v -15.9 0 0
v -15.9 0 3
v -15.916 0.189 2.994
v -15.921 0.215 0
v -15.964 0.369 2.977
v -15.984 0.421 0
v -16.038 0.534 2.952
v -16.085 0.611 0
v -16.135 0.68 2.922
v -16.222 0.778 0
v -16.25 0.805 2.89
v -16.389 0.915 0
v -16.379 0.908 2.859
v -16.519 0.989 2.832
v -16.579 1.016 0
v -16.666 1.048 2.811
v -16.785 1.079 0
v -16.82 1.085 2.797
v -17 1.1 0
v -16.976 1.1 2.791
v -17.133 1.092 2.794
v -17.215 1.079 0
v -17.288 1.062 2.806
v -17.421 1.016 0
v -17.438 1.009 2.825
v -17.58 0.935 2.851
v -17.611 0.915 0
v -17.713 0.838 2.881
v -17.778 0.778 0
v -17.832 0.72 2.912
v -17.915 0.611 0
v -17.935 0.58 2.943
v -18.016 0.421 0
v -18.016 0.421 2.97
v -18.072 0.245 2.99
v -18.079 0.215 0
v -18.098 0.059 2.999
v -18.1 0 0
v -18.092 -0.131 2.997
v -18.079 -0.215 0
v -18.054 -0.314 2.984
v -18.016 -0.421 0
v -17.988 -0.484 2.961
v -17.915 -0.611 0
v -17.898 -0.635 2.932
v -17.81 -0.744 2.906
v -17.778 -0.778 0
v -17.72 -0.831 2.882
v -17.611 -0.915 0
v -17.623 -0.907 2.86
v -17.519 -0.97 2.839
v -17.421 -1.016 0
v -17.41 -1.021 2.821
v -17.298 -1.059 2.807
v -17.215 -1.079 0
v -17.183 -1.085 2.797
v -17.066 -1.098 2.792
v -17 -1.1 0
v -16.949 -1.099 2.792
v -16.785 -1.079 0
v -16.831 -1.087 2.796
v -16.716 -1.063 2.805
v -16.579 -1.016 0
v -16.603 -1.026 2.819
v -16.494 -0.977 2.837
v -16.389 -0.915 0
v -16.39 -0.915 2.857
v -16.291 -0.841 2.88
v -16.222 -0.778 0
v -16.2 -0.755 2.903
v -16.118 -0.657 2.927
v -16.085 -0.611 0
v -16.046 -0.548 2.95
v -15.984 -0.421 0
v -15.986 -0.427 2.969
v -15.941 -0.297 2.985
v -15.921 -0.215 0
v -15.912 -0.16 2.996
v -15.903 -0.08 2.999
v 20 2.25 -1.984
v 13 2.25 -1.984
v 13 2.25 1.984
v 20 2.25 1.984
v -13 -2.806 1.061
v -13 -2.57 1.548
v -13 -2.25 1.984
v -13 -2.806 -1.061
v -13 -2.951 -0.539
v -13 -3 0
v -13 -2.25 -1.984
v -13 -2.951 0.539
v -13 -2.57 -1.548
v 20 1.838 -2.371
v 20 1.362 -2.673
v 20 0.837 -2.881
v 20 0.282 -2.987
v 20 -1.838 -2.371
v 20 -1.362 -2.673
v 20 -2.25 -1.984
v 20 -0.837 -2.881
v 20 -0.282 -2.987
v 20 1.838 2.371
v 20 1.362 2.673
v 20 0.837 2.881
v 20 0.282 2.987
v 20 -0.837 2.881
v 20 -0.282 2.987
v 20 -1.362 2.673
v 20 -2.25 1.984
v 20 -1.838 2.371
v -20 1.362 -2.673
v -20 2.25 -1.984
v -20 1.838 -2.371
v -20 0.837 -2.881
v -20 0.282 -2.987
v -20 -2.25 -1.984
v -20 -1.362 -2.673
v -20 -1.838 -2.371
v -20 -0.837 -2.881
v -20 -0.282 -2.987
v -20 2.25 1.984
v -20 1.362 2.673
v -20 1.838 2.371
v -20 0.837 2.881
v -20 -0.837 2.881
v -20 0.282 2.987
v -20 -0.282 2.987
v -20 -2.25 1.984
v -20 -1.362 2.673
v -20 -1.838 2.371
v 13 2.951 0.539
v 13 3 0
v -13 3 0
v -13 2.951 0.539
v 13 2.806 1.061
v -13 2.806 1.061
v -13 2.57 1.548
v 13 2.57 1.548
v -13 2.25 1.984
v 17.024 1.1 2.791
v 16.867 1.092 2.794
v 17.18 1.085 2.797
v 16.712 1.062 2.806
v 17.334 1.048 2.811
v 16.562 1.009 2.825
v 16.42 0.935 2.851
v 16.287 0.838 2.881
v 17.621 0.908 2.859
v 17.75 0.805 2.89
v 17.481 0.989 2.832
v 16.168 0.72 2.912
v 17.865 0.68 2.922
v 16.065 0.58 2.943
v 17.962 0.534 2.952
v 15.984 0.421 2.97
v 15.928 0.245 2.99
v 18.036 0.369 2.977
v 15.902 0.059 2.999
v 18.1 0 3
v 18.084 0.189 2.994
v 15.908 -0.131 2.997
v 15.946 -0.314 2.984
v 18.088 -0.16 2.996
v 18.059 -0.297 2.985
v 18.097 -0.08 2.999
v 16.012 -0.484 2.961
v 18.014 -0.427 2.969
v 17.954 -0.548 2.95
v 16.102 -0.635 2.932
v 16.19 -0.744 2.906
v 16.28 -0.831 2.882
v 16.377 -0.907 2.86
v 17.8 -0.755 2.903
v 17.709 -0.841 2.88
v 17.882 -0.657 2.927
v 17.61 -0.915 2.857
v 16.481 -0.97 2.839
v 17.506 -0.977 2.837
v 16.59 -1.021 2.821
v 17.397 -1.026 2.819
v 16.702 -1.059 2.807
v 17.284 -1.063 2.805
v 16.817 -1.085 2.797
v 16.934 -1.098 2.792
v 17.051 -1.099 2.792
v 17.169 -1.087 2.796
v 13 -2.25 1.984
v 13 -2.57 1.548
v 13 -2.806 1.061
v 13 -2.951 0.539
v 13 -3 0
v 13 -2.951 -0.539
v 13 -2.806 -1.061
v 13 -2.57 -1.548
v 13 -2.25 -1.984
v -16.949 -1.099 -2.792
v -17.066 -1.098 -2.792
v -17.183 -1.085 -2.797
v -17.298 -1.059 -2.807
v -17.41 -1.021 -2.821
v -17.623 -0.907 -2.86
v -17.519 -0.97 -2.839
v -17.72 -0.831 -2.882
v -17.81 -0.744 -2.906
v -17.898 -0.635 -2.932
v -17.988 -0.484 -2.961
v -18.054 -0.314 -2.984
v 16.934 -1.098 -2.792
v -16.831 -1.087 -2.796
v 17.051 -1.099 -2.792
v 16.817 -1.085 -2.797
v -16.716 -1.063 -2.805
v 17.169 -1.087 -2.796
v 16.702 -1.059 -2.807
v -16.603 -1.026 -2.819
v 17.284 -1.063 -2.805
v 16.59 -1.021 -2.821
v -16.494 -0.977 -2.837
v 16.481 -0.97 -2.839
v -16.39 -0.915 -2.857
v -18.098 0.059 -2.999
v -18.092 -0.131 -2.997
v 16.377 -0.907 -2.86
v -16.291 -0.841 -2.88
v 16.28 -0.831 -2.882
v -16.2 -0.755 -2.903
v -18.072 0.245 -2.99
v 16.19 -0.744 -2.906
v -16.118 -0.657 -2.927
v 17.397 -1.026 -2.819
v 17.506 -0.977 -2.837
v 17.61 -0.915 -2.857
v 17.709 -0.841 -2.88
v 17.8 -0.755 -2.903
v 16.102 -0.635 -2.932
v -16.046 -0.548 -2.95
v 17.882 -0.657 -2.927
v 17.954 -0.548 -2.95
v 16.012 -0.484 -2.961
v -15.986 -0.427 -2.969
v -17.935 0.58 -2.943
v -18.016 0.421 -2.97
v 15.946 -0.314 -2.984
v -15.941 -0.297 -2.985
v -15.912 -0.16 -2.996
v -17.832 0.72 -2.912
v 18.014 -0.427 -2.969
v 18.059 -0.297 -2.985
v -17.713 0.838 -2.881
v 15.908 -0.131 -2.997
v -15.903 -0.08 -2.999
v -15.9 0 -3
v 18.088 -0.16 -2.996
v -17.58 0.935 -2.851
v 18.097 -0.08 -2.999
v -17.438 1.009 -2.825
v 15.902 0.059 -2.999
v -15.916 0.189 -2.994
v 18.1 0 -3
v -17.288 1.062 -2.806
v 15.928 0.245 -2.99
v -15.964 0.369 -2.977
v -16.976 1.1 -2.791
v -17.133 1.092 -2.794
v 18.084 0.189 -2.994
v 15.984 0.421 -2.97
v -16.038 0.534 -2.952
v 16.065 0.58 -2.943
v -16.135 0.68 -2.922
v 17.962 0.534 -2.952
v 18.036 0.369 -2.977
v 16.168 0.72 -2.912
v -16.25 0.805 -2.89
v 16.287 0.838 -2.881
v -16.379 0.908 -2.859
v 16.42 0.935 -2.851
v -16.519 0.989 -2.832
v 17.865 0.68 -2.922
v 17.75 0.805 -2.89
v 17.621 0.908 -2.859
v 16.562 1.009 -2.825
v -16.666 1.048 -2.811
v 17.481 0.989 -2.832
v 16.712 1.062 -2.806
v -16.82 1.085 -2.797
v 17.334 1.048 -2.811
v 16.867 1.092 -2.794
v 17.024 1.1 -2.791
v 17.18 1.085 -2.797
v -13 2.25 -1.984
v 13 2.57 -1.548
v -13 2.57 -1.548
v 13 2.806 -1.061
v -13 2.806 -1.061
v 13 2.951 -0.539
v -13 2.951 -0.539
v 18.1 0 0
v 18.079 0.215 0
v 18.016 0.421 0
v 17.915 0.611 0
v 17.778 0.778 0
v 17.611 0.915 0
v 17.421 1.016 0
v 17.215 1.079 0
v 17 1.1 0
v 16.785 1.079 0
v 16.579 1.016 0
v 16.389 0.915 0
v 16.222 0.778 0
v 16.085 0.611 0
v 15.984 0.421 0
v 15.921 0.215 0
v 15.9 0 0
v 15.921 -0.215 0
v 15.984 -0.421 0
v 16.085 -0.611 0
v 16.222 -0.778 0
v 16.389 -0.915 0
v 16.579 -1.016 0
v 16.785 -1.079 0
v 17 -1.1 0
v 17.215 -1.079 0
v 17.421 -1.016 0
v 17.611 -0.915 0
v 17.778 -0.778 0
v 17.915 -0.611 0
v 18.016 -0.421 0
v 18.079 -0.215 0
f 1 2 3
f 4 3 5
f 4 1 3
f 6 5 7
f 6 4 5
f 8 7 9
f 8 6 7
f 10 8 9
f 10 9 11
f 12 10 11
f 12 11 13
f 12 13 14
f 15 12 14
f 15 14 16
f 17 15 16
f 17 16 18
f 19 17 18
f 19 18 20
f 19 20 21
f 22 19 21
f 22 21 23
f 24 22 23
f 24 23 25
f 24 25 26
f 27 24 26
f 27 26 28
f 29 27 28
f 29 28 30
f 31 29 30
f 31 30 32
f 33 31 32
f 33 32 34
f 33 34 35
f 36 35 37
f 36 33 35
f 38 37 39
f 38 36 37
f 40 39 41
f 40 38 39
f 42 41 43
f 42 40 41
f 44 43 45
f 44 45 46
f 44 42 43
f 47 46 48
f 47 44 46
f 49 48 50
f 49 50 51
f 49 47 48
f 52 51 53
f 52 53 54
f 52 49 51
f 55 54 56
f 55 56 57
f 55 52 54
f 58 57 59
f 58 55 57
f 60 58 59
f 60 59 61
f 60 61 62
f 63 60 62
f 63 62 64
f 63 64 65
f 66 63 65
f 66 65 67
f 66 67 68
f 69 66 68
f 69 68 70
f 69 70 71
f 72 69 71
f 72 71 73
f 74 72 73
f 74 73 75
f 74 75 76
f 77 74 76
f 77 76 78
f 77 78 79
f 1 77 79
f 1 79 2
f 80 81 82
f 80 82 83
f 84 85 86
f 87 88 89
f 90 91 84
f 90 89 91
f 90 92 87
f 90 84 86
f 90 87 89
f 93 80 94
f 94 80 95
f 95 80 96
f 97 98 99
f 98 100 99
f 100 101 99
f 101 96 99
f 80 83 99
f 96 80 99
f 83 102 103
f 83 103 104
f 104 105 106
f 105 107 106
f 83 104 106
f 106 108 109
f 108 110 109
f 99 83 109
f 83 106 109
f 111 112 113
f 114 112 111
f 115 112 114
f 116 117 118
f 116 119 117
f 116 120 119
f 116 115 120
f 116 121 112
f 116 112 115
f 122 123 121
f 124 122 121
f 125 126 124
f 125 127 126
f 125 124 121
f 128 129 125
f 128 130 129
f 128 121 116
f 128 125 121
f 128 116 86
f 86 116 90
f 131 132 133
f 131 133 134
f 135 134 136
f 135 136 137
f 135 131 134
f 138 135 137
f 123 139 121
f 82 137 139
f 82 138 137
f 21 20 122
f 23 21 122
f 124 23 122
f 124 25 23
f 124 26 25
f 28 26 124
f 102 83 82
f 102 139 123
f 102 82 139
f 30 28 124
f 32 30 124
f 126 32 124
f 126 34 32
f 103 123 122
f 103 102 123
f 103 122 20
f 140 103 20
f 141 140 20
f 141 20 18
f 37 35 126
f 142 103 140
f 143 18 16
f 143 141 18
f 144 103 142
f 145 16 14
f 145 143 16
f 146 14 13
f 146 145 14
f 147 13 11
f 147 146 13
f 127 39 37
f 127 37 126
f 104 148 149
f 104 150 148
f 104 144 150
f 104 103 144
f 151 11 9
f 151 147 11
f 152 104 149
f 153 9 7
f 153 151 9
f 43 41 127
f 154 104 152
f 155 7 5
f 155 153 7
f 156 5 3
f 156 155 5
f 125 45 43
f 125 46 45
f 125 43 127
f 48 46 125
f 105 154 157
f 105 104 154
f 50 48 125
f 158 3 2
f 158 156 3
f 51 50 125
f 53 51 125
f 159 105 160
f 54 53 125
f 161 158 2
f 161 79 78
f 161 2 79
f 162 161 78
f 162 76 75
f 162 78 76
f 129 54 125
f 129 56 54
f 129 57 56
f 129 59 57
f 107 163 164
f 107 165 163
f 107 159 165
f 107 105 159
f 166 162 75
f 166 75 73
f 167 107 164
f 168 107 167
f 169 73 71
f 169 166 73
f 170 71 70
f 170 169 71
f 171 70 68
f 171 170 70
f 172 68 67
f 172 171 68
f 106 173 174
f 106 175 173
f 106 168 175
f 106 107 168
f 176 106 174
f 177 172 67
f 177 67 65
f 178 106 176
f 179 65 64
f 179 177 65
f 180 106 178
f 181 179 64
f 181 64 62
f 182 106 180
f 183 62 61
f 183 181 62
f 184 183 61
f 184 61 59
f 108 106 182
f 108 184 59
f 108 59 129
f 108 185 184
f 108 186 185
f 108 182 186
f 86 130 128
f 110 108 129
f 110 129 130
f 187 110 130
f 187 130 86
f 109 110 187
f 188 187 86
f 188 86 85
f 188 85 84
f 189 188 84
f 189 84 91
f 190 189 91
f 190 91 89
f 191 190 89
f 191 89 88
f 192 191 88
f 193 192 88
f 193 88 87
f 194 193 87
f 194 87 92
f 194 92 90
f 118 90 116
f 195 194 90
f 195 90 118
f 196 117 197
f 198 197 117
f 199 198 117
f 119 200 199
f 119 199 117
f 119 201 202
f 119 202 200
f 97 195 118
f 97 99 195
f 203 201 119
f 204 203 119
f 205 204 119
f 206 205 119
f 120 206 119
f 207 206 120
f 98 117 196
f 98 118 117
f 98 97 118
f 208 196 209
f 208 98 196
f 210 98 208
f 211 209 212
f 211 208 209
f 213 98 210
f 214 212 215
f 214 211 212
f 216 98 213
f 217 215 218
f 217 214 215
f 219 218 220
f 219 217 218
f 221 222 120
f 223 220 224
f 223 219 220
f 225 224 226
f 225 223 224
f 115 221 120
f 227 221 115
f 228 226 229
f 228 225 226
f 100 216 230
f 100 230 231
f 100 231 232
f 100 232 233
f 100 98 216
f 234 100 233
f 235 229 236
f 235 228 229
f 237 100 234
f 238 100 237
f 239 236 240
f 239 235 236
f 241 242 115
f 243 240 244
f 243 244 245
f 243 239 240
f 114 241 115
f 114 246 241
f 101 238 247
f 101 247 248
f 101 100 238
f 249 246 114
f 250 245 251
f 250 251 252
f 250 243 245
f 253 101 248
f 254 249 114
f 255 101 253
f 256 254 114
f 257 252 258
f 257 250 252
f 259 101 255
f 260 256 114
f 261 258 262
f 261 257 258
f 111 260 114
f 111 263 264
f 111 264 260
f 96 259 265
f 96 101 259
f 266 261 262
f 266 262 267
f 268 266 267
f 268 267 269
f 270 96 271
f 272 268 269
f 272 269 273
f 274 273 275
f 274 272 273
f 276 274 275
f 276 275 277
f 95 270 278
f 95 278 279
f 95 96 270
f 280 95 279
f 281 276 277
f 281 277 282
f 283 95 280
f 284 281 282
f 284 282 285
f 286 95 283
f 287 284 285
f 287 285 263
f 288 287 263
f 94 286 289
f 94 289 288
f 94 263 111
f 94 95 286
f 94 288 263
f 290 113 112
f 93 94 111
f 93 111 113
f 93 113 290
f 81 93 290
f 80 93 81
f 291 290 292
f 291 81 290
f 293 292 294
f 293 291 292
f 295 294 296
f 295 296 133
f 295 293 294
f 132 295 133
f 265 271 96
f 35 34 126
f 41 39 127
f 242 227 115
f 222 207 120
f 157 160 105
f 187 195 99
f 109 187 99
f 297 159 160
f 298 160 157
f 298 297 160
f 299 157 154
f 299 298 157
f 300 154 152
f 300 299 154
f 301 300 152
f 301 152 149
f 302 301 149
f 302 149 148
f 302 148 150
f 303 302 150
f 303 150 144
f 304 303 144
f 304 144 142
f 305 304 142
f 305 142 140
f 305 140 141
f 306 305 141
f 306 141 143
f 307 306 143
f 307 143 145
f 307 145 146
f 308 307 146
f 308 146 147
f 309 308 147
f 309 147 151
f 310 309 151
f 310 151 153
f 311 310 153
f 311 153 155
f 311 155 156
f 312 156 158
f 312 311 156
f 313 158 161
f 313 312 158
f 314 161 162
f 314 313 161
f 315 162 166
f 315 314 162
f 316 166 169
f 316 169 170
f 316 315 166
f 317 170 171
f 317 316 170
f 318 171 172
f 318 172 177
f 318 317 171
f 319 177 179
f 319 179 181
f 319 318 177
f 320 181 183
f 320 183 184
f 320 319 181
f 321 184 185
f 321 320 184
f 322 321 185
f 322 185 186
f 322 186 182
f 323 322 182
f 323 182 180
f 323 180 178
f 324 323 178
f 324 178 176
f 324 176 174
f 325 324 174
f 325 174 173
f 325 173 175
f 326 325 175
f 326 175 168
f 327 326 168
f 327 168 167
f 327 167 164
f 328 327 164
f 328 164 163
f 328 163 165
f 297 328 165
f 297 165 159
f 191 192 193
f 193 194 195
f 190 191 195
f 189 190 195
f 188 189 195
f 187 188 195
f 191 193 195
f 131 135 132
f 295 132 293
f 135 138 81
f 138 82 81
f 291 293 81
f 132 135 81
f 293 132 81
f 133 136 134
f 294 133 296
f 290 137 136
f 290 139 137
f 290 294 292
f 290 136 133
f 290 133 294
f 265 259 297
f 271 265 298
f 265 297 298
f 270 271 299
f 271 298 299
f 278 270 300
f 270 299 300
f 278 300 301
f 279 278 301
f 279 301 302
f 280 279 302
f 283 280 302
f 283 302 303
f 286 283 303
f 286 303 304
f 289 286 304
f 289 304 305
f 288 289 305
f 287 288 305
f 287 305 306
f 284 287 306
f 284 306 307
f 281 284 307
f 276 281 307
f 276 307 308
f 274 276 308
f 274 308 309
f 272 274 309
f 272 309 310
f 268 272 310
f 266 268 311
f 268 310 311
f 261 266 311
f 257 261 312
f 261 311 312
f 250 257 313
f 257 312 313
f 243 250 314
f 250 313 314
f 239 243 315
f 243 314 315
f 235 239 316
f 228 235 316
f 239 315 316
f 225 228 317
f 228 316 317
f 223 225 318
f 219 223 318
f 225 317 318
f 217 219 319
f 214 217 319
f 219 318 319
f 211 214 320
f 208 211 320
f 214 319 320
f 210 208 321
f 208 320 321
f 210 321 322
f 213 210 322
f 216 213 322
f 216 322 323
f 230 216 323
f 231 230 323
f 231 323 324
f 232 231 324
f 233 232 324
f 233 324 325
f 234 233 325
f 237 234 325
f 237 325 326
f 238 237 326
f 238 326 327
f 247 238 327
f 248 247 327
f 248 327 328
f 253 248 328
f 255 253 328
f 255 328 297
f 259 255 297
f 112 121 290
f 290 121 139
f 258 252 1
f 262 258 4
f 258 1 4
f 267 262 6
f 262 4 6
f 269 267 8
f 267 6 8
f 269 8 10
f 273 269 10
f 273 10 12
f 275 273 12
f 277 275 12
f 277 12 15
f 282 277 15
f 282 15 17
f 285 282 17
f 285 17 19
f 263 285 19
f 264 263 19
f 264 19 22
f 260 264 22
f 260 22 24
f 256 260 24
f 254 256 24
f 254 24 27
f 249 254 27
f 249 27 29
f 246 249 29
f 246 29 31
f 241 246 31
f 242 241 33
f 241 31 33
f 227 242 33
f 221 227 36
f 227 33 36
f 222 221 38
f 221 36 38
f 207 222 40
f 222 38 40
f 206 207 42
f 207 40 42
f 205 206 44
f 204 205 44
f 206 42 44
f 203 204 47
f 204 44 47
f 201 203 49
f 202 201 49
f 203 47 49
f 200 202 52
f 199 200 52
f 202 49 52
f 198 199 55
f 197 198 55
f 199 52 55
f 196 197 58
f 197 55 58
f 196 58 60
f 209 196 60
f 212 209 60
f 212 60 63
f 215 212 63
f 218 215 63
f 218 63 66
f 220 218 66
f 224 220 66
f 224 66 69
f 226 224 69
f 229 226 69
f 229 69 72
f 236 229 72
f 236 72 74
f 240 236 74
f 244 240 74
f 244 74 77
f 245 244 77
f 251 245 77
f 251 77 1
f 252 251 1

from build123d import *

# Parameters (mm, degrees)
SKETCH1_W               = 40
SKETCH1_H               = 3
SKETCH2_W               = 7
SKETCH2_H               = 0.75
CUT_EXTRUDE1_DEPTH      = 4
CUT_EXTRUDE1_DEPTH_BACK = 4
SKETCH3_R               = 1.1
CUT_EXTRUDE2_DEPTH      = 4
CUT_EXTRUDE2_DEPTH_BACK = 4


with BuildPart() as part:
    # Sketch1 → Revolve1 (revolve)
    with BuildSketch(Plane.XY):
        with Locations((0, 1.5)):
            Rectangle(SKETCH1_W, SKETCH1_H)
    revolve(axis=Axis((0, 0, 0), (1, 0, 0)))

    # Sketch2 → Cut-Extrude1 (cut, two sides)
    with BuildSketch(Plane.XY) as cut_extrude1_sk:
        with Locations((-16.5, 2.625)):
            Rectangle(SKETCH2_W, SKETCH2_H)
        with Locations((-16.5, -2.625)):
            Rectangle(SKETCH2_W, SKETCH2_H)
        with Locations((16.5, 2.625)):
            Rectangle(SKETCH2_W, SKETCH2_H)
        with Locations((16.5, -2.625)):
            Rectangle(SKETCH2_W, SKETCH2_H)
    extrude(amount=CUT_EXTRUDE1_DEPTH, mode=Mode.SUBTRACT)
    extrude(cut_extrude1_sk.sketch, amount=-CUT_EXTRUDE1_DEPTH_BACK, mode=Mode.SUBTRACT)

    # Sketch3 → Cut-Extrude2 (cut, two sides)
    with BuildSketch(Plane.XY) as cut_extrude2_sk:
        with Locations((-17, 0)):
            Circle(SKETCH3_R)
        with Locations((17, 0)):
            Circle(SKETCH3_R)
    extrude(amount=CUT_EXTRUDE2_DEPTH, mode=Mode.SUBTRACT)
    extrude(cut_extrude2_sk.sketch, amount=-CUT_EXTRUDE2_DEPTH_BACK, mode=Mode.SUBTRACT)


solid = part.part
